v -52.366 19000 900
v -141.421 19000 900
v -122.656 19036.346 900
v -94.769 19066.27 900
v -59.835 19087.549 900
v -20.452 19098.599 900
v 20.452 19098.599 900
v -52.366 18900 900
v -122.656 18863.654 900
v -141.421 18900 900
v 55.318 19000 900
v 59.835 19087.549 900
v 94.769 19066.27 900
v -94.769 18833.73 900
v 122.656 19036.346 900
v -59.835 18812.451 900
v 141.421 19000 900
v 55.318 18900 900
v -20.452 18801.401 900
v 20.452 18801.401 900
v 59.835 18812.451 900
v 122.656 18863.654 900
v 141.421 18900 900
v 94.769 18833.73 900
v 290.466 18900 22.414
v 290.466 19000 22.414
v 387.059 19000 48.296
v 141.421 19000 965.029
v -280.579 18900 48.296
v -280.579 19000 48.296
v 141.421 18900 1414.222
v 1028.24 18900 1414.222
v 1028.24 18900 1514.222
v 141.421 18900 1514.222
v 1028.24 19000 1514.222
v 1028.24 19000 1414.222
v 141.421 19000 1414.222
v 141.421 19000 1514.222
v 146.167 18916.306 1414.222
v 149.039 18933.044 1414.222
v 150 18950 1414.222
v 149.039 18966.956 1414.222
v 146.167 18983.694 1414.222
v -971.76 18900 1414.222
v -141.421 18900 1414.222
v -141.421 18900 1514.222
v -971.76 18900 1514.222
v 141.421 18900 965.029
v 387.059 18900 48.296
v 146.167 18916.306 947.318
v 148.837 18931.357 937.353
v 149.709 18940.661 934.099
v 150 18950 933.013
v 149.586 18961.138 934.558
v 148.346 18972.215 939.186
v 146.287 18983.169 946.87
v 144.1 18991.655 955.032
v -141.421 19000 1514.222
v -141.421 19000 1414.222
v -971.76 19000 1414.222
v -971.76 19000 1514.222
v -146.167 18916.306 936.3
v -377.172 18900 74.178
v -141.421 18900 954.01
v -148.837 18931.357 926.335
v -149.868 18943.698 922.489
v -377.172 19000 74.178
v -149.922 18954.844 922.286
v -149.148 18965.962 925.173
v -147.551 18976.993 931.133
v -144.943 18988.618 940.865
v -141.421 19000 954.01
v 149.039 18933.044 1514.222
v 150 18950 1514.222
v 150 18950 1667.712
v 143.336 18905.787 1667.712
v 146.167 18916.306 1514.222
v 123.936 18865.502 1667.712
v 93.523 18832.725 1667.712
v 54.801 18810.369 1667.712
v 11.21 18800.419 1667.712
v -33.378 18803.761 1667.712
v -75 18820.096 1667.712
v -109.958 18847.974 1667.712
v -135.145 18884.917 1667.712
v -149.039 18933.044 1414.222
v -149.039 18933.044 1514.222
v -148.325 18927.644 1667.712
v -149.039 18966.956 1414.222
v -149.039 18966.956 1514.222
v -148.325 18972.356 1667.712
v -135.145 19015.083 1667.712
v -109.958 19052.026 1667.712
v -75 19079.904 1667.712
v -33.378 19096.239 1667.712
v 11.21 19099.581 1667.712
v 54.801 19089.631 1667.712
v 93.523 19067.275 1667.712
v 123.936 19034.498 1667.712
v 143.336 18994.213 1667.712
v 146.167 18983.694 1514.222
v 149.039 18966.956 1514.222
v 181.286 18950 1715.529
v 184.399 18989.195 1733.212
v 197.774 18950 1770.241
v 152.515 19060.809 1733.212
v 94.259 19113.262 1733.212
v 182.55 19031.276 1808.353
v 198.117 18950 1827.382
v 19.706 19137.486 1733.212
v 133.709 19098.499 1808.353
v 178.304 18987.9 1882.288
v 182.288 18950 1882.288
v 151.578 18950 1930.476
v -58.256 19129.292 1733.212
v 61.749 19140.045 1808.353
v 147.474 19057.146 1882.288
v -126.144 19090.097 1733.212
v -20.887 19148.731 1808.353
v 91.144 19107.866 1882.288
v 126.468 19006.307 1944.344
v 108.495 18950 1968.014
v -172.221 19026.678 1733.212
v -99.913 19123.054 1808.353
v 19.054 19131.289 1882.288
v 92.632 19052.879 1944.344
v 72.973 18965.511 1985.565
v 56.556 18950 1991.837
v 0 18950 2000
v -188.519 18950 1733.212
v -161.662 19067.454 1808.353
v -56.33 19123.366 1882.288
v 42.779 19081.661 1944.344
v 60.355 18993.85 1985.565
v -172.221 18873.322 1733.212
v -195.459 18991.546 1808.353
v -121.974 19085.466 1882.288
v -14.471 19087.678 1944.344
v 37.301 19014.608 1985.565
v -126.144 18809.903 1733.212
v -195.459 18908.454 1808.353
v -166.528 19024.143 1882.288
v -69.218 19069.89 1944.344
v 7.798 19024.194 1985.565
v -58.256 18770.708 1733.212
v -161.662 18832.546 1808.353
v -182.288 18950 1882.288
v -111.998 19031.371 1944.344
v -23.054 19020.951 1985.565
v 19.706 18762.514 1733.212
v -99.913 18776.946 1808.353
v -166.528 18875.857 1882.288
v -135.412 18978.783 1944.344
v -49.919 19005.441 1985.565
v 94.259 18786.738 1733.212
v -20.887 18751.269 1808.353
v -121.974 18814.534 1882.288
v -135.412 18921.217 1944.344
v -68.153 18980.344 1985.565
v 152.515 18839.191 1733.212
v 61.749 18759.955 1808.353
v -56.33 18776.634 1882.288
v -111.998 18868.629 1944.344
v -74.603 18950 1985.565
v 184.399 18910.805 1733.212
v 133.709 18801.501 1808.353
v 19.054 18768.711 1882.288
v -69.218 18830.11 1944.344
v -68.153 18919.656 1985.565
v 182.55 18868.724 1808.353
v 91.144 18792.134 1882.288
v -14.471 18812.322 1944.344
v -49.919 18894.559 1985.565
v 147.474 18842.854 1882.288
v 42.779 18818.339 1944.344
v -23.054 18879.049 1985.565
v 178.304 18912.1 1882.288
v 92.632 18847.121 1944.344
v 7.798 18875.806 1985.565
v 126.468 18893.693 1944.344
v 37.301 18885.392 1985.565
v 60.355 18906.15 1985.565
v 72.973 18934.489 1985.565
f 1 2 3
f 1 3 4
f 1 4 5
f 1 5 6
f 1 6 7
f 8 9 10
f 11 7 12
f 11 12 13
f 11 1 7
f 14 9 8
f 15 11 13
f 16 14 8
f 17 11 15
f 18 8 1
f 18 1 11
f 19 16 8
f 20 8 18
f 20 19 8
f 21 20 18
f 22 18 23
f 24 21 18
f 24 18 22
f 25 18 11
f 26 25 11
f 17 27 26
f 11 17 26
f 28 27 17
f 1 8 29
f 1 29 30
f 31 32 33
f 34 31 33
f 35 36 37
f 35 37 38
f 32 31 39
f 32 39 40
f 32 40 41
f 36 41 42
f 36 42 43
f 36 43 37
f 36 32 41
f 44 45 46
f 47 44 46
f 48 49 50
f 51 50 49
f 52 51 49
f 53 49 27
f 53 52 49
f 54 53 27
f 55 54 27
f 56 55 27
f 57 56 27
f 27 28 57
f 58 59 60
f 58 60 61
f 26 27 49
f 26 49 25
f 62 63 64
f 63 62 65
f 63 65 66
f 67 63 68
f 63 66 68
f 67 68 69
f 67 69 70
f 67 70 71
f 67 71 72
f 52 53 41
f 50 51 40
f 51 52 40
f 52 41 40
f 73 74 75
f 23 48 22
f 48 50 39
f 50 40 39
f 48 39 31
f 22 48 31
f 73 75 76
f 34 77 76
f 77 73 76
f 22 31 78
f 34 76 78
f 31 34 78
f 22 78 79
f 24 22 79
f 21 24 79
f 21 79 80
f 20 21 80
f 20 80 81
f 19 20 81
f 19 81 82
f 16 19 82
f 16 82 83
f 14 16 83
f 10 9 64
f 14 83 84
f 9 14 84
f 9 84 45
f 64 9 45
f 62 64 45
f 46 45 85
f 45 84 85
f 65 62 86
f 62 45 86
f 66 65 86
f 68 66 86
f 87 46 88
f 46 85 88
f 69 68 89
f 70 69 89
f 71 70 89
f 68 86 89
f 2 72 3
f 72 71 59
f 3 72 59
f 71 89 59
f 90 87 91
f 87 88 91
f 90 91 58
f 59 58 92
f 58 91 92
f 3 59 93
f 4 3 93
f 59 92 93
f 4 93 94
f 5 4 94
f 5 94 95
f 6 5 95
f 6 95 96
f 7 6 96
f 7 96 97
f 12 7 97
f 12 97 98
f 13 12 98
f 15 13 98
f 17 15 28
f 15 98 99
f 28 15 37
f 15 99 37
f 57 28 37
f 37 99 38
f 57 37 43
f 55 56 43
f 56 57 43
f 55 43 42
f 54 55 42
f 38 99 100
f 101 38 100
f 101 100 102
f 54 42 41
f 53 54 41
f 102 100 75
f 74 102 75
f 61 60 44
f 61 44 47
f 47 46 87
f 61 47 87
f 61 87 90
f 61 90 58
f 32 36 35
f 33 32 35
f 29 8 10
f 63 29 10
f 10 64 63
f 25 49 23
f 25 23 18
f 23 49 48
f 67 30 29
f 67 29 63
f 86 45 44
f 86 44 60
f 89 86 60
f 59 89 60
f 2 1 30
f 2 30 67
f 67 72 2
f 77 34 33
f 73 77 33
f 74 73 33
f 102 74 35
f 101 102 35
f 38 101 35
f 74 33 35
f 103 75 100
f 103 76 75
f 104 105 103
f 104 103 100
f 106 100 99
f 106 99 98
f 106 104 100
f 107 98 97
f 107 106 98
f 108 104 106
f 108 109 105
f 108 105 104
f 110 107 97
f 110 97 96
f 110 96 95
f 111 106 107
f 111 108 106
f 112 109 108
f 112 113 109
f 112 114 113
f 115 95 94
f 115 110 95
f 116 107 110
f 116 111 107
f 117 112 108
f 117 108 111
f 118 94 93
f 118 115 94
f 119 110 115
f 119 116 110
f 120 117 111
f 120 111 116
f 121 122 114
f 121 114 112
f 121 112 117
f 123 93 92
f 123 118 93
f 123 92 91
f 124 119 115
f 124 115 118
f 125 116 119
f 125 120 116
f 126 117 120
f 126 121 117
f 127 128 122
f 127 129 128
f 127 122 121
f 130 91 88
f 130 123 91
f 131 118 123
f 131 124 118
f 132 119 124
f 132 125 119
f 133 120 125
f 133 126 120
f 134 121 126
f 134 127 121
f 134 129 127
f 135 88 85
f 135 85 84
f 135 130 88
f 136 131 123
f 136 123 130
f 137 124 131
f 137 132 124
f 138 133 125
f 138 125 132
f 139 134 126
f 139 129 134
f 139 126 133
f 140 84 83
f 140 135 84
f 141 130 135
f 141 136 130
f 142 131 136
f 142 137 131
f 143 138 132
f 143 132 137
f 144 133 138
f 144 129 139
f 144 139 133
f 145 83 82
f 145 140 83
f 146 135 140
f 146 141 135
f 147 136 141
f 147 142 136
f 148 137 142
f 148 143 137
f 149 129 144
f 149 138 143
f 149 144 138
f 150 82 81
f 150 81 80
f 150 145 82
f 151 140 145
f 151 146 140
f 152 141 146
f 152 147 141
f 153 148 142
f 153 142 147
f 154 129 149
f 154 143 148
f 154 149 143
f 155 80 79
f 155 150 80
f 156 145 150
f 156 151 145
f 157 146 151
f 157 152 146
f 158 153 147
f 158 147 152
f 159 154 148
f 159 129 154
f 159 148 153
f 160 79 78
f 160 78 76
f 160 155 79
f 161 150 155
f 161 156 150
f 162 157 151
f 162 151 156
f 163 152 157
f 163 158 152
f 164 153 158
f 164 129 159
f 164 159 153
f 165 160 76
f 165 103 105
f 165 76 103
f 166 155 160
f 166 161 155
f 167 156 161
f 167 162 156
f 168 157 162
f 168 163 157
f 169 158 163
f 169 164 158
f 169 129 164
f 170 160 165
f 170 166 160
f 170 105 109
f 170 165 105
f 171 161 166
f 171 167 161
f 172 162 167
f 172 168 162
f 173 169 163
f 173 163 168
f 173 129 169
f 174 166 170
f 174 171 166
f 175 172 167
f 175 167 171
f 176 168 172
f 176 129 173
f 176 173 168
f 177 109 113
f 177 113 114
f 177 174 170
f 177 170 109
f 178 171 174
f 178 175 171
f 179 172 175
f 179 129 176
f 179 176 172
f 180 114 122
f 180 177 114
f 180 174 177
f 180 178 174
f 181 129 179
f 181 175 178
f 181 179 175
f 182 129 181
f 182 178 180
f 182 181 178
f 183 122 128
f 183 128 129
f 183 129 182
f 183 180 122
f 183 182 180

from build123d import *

# Parameters (mm, degrees)
BOX002_W               = 100
BOX002_H               = 100
BOX002_DEPTH           = 1000
BOX002_PLACEMENT_ANGLE = 165
BOX001_W               = 100
BOX001_H               = 100
BOX001_DEPTH           = 1000
BOX001_PLACEMENT_ANGLE = 195
CYLINDER004_R          = 150
CYLINDER004_DEPTH      = 900
BOX003_W               = 100
BOX003_H               = 100
BOX003_DEPTH           = 2000


with BuildPart() as cube002:
    # Box002 → Box002 (new body)
    with BuildSketch(Plane.XY):
        with Locations((50, 50)):
            Rectangle(BOX002_W, BOX002_H)
    extrude(amount=BOX002_DEPTH)


with BuildPart() as cube002_1:
    # Box002 placement: moved
    add(cube002.part.moved(Location((-21.759997, -50, 1014.222118))).rotate(Axis((-21.759997, -50, 1014.222118), (0, -1, 0)), BOX002_PLACEMENT_ANGLE))


with BuildPart() as cube001:
    # Box001 → Box001 (new body)
    with BuildSketch(Plane.XY):
        with Locations((50, 50)):
            Rectangle(BOX001_W, BOX001_H)
    extrude(amount=BOX001_DEPTH)


with BuildPart() as cube001_1:
    # Box001 placement: moved
    add(cube001.part.moved(Location((128.240003, -50, 1014.222118))).rotate(Axis((128.240003, -50, 1014.222118), (0, -1, 0)), BOX001_PLACEMENT_ANGLE))


with BuildPart() as sphere003:
    # Sphere003 → Sphere003 (revolve)
    with BuildSketch(Plane(origin=(0, 0, 1800), x_dir=(1, 0, 0), z_dir=(0, -1, 0))):
        with BuildLine():
            ThreePointArc((0, -200), (200, 0), (0, 200))
            Line((0, 200), (0, -200))
        make_face()
    revolve(axis=Axis((0, 0, 1800), (0, 0, 1)))


with BuildPart() as cylinder004:
    # Cylinder004 → Cylinder004 (new body)
    with BuildSketch(Plane(origin=(0, 0, 1800), x_dir=(1, 0, 0), z_dir=(0, 0, -1))):
        Circle(CYLINDER004_R)
    extrude(amount=CYLINDER004_DEPTH)


with BuildPart() as fusion001:
    # Box003 → Box003 (new body)
    with BuildSketch(Plane(origin=(1028.240003, -50, 1414.222118), x_dir=(0, 0, 1), z_dir=(-1, 0, 0))):
        with Locations((50, 50)):
            Rectangle(BOX003_W, BOX003_H)
    extrude(amount=BOX003_DEPTH)

    # Fusion001: union Cube002, Cube001, Sphere003, Cylinder004
    add(cube002_1.part)
    add(cube001_1.part)
    add(sphere003.part)
    add(cylinder004.part)


with BuildPart() as fusion001_1:
    # Fusion001 placement: moved
    add(fusion001.part.moved(Location((0, 18950, 0))))


solid = fusion001_1.part
